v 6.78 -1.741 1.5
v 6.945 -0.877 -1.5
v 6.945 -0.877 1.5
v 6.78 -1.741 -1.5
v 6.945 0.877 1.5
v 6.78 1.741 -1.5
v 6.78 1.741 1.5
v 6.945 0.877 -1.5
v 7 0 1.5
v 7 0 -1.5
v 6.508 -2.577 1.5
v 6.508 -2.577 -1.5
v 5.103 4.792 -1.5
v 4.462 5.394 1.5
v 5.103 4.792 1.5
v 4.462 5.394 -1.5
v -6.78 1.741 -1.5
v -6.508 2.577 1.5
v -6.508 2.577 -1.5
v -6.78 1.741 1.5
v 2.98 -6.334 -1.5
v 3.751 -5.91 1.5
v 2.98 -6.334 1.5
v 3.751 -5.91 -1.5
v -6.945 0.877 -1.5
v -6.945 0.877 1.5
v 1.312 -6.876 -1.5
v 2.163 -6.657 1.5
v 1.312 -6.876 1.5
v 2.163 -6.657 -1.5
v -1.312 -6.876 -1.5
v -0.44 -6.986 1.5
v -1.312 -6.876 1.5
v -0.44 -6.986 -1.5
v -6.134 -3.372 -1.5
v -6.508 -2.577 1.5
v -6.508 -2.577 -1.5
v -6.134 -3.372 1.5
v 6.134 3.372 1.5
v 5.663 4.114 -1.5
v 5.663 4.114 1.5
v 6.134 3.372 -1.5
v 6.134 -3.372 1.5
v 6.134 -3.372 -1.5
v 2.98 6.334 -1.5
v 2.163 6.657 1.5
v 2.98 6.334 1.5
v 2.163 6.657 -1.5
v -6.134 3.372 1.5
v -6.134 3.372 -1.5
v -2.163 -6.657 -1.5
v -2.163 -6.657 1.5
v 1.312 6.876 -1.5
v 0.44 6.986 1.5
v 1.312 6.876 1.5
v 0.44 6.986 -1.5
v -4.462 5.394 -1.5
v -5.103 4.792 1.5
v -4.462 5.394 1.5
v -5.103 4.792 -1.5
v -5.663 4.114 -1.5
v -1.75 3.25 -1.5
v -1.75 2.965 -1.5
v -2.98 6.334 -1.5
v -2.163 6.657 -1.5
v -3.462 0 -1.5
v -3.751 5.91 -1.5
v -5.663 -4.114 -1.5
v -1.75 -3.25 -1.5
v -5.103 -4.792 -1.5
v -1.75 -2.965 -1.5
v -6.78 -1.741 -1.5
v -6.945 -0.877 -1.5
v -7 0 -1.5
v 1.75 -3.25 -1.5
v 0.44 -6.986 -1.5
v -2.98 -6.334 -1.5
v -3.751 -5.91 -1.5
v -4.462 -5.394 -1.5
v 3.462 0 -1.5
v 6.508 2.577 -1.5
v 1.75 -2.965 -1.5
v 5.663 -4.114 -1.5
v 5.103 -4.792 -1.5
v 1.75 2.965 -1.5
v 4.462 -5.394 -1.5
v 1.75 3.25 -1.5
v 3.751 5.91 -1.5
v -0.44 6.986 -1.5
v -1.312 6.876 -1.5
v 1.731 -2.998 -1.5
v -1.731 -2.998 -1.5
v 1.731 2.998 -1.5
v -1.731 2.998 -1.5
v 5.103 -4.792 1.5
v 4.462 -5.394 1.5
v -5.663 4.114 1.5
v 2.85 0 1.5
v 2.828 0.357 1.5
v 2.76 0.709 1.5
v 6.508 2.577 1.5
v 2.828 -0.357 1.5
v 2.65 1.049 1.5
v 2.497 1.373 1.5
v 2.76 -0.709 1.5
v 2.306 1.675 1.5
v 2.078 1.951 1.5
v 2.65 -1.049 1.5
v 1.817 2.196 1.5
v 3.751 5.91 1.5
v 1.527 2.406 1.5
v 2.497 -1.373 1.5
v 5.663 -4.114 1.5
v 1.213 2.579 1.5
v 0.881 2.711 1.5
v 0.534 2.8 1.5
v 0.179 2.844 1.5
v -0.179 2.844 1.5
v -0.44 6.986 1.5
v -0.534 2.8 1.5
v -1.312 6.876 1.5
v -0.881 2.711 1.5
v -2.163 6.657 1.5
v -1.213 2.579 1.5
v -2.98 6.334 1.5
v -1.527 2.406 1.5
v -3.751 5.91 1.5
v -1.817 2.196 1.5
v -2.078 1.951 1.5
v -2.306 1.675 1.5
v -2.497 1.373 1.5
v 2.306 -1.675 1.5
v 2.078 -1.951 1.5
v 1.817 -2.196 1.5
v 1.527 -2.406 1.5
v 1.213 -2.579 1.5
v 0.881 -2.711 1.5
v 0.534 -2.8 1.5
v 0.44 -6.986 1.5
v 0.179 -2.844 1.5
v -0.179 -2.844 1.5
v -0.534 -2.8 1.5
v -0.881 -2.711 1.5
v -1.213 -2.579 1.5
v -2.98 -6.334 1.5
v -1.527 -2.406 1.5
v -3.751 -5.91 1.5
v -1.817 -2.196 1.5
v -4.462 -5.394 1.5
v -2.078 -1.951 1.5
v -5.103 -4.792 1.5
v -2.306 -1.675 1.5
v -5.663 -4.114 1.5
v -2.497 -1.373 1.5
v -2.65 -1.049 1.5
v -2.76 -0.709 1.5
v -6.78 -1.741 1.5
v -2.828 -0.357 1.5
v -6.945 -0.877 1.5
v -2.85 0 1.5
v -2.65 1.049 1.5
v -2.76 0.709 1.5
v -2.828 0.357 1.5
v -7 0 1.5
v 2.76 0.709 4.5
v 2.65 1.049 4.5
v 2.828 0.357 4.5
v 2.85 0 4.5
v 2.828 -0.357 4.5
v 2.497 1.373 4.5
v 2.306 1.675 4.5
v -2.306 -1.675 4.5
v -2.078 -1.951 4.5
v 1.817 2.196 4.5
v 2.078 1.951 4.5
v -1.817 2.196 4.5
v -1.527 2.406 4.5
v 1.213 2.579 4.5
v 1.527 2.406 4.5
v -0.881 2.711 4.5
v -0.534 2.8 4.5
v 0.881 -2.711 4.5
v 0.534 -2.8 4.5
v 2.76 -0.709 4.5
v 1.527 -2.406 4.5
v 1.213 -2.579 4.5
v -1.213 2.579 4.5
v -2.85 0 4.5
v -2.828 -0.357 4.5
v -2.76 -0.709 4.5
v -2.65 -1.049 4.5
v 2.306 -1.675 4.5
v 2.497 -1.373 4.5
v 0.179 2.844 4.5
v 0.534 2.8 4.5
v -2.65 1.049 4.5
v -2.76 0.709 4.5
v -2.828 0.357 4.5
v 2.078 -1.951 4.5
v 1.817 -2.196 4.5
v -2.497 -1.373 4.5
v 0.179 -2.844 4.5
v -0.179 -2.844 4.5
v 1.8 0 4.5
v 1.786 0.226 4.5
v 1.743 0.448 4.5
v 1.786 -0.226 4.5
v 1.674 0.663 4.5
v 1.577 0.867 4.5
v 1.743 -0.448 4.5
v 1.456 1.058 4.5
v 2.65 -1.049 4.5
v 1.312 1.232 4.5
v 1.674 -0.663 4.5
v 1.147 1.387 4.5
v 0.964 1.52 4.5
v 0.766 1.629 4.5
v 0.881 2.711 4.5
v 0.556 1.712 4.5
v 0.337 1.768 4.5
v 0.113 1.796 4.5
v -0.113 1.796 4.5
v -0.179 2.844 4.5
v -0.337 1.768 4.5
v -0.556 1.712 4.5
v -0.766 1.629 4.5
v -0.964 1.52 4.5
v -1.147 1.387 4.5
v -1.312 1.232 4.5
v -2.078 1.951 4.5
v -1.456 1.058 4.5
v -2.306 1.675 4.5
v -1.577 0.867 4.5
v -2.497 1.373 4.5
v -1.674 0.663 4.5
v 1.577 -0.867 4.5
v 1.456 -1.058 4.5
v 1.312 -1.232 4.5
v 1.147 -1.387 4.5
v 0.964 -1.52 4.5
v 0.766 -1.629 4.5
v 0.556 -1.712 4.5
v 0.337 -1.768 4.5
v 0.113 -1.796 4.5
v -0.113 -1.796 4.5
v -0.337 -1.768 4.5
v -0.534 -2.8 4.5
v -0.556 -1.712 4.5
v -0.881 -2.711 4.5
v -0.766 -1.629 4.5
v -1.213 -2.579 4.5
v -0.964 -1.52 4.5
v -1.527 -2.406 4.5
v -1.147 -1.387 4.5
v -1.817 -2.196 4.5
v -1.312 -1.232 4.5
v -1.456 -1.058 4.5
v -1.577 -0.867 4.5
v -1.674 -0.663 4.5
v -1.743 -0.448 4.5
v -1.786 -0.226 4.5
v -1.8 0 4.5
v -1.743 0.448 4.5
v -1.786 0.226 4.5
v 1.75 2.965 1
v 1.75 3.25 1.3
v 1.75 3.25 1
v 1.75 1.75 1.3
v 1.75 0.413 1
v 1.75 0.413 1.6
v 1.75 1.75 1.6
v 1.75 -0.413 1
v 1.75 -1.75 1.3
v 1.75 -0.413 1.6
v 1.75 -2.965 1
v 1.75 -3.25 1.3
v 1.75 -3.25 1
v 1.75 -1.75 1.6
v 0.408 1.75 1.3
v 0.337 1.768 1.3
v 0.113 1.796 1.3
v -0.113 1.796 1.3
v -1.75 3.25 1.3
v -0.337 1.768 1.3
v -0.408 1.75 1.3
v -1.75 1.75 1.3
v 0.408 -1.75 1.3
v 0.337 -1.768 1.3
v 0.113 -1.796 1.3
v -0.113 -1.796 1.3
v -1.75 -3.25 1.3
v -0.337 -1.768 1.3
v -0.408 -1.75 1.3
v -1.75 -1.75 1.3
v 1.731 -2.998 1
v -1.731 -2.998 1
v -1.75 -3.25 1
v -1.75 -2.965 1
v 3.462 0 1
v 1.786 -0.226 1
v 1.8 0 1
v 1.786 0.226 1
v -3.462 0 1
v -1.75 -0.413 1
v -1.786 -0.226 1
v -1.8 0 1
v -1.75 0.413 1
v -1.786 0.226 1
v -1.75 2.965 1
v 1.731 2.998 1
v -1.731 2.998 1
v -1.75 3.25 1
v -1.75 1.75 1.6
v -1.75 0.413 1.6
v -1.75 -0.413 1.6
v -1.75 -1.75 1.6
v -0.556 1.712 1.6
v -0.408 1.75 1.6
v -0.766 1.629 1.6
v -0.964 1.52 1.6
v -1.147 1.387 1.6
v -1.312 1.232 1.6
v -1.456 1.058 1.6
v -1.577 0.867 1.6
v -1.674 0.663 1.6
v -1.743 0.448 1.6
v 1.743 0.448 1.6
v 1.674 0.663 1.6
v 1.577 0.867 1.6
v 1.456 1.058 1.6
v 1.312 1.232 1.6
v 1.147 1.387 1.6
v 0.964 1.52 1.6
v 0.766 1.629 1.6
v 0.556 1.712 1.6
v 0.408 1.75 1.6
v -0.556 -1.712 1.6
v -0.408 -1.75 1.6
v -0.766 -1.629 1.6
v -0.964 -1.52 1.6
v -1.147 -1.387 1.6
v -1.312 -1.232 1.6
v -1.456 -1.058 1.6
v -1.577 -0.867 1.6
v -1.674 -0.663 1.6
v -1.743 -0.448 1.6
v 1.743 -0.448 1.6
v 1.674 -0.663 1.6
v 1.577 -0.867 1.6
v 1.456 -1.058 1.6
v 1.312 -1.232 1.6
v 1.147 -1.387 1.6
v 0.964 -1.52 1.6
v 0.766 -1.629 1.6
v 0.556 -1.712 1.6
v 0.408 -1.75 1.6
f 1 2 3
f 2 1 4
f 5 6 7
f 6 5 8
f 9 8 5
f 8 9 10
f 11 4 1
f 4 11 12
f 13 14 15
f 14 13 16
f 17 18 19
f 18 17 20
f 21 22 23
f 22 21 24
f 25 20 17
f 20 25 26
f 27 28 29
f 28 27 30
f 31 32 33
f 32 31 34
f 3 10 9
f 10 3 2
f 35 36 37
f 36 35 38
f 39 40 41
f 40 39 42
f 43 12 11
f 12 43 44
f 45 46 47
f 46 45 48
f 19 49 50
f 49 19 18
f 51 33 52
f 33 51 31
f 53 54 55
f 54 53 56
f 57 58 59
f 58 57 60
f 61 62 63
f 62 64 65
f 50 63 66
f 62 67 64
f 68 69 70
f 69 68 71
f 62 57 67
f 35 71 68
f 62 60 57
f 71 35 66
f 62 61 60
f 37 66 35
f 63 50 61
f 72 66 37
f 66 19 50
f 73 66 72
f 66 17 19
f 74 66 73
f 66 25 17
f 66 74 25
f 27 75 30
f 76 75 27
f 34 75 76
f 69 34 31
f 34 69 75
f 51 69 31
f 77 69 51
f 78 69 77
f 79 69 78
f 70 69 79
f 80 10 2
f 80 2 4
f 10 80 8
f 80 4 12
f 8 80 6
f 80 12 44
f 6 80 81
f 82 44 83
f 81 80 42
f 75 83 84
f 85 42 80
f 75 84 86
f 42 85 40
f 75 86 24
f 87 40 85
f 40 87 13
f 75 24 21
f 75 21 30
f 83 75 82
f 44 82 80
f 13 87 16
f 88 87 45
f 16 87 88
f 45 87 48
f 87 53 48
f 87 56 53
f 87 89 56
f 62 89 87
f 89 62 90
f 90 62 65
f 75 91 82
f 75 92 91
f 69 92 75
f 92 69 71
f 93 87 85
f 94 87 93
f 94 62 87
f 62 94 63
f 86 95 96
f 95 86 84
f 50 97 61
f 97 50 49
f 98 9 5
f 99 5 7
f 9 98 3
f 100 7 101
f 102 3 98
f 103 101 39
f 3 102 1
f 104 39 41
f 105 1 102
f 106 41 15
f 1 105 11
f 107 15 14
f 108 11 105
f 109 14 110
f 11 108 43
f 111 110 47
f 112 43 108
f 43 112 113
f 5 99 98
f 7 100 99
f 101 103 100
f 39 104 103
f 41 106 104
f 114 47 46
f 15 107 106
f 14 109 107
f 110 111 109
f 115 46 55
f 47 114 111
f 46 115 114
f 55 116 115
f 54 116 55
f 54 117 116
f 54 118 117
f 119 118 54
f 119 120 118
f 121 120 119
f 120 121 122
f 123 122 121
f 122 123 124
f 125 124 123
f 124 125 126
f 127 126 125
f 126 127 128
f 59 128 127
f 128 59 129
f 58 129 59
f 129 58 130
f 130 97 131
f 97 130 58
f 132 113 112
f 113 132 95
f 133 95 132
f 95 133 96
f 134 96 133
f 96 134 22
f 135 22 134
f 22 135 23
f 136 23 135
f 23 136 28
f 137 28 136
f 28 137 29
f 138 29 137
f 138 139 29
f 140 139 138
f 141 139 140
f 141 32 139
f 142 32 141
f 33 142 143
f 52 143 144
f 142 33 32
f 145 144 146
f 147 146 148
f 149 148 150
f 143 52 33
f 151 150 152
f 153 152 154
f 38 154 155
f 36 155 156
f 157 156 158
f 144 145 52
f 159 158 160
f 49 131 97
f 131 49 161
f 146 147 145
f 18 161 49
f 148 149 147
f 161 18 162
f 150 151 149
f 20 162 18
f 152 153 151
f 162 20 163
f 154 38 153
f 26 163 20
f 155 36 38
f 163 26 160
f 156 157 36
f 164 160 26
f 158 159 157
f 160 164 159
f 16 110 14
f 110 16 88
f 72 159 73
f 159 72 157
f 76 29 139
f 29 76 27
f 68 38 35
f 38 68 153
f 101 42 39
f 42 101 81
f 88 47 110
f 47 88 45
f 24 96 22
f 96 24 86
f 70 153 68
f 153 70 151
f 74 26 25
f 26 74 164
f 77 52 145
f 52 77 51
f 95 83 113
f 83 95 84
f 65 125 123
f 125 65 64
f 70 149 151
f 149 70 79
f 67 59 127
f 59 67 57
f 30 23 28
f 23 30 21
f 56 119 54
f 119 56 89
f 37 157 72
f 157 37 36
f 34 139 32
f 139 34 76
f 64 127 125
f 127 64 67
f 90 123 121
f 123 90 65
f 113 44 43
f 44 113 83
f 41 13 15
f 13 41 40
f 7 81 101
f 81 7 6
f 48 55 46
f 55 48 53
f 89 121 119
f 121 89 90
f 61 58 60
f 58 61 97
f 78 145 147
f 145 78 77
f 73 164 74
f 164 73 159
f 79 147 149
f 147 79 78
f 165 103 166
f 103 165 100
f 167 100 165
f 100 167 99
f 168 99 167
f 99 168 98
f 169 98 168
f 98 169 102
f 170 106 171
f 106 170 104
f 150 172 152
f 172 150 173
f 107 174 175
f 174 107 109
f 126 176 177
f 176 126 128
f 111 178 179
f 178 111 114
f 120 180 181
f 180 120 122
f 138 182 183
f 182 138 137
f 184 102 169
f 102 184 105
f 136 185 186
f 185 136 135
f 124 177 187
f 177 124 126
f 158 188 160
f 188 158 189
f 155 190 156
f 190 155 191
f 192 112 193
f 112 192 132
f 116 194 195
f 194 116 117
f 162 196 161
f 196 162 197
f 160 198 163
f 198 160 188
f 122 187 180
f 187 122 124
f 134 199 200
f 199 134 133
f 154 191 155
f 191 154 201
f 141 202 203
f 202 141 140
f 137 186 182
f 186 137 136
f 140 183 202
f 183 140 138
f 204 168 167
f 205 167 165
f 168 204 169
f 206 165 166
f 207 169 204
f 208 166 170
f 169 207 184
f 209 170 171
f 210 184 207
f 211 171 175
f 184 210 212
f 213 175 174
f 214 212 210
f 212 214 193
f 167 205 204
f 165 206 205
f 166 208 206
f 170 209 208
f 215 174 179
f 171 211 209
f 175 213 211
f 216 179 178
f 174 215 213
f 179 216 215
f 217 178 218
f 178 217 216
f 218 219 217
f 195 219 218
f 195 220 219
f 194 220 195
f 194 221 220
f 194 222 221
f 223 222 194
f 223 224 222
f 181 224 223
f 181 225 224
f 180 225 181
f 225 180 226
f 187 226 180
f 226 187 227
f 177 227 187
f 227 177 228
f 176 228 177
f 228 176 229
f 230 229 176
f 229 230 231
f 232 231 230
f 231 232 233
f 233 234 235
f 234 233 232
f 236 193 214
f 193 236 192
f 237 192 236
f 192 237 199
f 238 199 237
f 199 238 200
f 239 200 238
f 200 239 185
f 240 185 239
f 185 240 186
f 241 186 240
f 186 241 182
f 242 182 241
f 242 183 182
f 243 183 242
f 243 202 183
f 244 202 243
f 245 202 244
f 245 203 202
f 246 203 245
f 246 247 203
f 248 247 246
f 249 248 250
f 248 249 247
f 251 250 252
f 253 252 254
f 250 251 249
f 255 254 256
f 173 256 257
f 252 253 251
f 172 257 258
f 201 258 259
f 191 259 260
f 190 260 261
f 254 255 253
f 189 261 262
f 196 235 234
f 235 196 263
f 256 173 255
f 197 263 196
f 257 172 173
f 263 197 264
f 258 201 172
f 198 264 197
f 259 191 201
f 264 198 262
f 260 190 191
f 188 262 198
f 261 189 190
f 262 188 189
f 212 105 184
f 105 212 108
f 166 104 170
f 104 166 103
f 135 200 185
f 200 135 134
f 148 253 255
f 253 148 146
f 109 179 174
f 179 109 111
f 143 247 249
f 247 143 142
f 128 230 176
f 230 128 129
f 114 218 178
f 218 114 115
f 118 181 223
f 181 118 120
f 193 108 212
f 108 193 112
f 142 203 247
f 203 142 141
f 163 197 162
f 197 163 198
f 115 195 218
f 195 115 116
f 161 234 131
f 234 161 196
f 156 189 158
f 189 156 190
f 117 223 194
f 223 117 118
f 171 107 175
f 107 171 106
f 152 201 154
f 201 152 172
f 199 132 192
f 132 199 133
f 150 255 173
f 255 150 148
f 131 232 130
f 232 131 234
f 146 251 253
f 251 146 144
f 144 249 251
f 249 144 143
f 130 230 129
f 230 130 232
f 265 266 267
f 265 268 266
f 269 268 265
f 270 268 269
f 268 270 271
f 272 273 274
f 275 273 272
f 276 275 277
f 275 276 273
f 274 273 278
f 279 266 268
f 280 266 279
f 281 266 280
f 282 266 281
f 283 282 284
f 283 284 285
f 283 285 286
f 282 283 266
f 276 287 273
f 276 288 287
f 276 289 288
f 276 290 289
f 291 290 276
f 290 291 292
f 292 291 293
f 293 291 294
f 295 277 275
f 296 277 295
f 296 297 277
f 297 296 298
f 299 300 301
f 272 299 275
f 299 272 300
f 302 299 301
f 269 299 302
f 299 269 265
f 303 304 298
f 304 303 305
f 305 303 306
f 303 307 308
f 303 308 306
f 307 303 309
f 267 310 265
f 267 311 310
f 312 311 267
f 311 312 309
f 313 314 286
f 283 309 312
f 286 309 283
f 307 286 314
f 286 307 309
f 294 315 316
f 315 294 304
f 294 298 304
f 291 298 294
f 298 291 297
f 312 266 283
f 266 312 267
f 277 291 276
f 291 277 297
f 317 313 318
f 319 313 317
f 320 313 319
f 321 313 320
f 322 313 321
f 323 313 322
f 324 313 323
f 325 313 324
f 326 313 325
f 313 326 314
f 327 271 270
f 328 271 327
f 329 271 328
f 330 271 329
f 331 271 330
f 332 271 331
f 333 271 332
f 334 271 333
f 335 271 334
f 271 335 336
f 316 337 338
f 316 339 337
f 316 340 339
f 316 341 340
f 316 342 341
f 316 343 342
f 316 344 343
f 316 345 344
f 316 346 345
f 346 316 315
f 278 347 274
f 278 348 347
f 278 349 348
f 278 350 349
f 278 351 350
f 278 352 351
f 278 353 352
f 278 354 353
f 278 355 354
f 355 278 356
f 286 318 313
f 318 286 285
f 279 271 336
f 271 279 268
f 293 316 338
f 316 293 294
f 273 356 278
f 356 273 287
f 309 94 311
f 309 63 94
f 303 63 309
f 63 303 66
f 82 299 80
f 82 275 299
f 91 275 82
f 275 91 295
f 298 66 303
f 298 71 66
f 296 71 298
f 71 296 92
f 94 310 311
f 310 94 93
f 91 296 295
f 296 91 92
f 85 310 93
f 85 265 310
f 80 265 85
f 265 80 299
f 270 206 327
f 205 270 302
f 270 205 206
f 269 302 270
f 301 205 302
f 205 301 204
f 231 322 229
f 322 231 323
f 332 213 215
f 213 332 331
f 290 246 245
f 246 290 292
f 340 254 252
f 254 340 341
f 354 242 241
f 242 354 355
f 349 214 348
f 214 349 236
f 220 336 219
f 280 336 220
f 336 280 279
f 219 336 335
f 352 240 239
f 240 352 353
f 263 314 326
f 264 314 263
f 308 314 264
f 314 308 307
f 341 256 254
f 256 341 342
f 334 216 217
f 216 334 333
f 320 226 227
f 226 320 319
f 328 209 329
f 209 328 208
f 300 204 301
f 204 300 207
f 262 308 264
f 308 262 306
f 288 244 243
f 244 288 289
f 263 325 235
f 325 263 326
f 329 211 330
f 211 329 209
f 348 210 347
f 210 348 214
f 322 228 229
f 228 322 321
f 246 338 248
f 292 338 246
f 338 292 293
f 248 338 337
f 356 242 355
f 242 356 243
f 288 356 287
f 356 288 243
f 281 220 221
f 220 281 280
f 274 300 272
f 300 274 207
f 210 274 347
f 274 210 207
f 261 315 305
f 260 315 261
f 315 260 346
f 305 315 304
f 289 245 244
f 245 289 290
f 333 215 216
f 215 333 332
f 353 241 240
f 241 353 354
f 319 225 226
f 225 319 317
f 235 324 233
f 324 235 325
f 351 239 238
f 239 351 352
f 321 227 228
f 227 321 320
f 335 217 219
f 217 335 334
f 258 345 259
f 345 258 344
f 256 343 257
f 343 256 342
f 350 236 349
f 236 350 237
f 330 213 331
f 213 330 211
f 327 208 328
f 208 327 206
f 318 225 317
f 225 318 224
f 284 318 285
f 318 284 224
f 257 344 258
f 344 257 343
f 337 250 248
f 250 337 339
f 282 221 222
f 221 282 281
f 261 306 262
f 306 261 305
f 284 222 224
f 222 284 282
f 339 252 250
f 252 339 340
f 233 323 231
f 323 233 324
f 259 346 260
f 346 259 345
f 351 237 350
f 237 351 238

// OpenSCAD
$fn = 50;


difference() {
	union() {
		translate(v = [0, 0, -1.5000000000]) {
			cylinder(h = 3, r = 7.0000000000);
		}
		translate(v = [0, 0, -1.5000000000]) {
			cylinder(h = 6, r = 2.8500000000);
		}
	}
	union() {
		translate(v = [0, 0, -1.5000000000]) {
			rotate(a = [0, 0, 0]) {
				difference() {
					union() {
						translate(v = [-1.7500000000, -3.2500000000, -0.3000000000]) {
							cube(size = [3.5000000000, 6.5000000000, 0.3000000000]);
						}
						translate(v = [-1.7500000000, -1.7500000000, -0.6000000000]) {
							cube(size = [3.5000000000, 3.5000000000, 0.3000000000]);
						}
						translate(v = [-1.7500000000, -3.2500000000, 2.5000000000]) {
							cube(size = [3.5000000000, 6.5000000000, 0.3000000000]);
						}
						translate(v = [-1.7500000000, -1.7500000000, 2.8000000000]) {
							cube(size = [3.5000000000, 3.5000000000, 0.3000000000]);
						}
						linear_extrude(height = 2.5000000000) {
							polygon(points = [[3.4620000000, 0.0000000000], [1.7310000000, 2.9981799479], [-1.7310000000, 2.9981799479], [-3.4620000000, 0.0000000000], [-1.7310000000, -2.9981799479], [1.7310000000, -2.9981799479]]);
						}
						translate(v = [-1.7500000000, -3.2500000000, -0.3000000000]) {
							cube(size = [3.5000000000, 6.5000000000, 0.3000000000]);
						}
						translate(v = [-1.7500000000, -1.7500000000, -0.6000000000]) {
							cube(size = [3.5000000000, 3.5000000000, 0.3000000000]);
						}
						translate(v = [-1.7500000000, -3.2500000000, 2.5000000000]) {
							cube(size = [3.5000000000, 6.5000000000, 0.3000000000]);
						}
						translate(v = [-1.7500000000, -1.7500000000, 2.8000000000]) {
							cube(size = [3.5000000000, 3.5000000000, 0.3000000000]);
						}
						translate(v = [-1.7500000000, -3.2500000000, -0.3000000000]) {
							cube(size = [3.5000000000, 6.5000000000, 0.3000000000]);
						}
						translate(v = [-1.7500000000, -1.7500000000, -0.6000000000]) {
							cube(size = [3.5000000000, 3.5000000000, 0.3000000000]);
						}
						translate(v = [-1.7500000000, -3.2500000000, 2.5000000000]) {
							cube(size = [3.5000000000, 6.5000000000, 0.3000000000]);
						}
						translate(v = [-1.7500000000, -1.7500000000, 2.8000000000]) {
							cube(size = [3.5000000000, 3.5000000000, 0.3000000000]);
						}
					}
					union();
				}
			}
		}
		translate(v = [0, 0, -100.0000000000]) {
			cylinder(h = 200, r = 1.8000000000);
		}
	}
}
